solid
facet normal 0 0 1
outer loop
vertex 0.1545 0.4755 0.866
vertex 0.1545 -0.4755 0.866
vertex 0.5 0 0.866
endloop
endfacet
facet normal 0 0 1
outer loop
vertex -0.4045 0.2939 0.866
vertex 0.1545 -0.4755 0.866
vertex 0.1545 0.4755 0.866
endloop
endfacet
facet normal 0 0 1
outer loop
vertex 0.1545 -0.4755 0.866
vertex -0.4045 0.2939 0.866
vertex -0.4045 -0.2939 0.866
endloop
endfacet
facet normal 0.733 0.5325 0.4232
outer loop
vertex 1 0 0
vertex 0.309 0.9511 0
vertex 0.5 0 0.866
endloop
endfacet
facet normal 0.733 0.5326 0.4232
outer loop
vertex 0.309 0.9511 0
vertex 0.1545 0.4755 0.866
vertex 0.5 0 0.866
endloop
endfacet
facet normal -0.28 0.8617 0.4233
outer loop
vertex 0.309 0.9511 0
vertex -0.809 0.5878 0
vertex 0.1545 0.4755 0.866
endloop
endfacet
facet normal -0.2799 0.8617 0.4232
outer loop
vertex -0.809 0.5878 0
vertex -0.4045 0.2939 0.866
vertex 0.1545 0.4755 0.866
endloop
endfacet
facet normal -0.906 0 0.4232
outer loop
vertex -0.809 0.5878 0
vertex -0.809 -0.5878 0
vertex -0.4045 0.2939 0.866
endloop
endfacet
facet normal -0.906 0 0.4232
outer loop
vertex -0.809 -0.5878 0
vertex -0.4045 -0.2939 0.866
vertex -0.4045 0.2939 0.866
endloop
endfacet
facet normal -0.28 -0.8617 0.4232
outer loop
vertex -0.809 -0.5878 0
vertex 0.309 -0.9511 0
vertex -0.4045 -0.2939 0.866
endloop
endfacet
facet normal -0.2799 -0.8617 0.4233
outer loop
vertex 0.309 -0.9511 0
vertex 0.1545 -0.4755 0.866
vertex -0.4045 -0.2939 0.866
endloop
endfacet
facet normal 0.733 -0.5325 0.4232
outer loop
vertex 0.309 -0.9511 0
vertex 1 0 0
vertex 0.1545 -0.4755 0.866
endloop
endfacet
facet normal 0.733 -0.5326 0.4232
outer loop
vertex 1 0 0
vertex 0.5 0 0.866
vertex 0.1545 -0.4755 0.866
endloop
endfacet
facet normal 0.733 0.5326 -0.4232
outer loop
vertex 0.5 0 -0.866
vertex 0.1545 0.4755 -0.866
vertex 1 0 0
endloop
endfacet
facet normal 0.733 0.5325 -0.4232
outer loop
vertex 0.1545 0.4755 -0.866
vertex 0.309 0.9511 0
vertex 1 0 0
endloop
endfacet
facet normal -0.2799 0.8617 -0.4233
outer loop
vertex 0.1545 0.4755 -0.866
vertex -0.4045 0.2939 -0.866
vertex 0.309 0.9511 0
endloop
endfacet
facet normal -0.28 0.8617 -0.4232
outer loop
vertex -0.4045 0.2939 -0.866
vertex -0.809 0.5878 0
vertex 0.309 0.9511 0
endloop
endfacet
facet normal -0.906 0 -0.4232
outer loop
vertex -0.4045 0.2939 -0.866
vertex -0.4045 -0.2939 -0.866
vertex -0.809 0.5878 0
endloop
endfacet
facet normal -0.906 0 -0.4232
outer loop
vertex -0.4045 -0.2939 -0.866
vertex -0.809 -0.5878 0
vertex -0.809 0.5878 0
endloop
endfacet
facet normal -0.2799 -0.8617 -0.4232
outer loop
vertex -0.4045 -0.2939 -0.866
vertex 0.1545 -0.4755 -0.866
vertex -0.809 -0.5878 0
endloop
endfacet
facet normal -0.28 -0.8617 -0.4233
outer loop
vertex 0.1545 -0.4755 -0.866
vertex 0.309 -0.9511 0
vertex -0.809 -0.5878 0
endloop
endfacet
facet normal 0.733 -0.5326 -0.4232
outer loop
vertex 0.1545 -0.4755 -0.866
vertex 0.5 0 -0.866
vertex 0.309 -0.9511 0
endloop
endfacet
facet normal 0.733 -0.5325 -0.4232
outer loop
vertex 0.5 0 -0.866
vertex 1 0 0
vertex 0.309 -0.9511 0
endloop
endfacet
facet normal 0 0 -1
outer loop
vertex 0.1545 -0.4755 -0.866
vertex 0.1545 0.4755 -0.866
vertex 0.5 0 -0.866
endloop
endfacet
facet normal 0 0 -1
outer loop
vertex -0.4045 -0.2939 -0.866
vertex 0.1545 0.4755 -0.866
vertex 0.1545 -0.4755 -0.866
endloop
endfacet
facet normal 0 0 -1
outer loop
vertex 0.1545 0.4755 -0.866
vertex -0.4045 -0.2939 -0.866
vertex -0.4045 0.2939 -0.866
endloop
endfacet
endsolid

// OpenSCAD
module gear_a__gear() cube(1);
module gear_b__gear() sphere(1);
gear_b__gear();
